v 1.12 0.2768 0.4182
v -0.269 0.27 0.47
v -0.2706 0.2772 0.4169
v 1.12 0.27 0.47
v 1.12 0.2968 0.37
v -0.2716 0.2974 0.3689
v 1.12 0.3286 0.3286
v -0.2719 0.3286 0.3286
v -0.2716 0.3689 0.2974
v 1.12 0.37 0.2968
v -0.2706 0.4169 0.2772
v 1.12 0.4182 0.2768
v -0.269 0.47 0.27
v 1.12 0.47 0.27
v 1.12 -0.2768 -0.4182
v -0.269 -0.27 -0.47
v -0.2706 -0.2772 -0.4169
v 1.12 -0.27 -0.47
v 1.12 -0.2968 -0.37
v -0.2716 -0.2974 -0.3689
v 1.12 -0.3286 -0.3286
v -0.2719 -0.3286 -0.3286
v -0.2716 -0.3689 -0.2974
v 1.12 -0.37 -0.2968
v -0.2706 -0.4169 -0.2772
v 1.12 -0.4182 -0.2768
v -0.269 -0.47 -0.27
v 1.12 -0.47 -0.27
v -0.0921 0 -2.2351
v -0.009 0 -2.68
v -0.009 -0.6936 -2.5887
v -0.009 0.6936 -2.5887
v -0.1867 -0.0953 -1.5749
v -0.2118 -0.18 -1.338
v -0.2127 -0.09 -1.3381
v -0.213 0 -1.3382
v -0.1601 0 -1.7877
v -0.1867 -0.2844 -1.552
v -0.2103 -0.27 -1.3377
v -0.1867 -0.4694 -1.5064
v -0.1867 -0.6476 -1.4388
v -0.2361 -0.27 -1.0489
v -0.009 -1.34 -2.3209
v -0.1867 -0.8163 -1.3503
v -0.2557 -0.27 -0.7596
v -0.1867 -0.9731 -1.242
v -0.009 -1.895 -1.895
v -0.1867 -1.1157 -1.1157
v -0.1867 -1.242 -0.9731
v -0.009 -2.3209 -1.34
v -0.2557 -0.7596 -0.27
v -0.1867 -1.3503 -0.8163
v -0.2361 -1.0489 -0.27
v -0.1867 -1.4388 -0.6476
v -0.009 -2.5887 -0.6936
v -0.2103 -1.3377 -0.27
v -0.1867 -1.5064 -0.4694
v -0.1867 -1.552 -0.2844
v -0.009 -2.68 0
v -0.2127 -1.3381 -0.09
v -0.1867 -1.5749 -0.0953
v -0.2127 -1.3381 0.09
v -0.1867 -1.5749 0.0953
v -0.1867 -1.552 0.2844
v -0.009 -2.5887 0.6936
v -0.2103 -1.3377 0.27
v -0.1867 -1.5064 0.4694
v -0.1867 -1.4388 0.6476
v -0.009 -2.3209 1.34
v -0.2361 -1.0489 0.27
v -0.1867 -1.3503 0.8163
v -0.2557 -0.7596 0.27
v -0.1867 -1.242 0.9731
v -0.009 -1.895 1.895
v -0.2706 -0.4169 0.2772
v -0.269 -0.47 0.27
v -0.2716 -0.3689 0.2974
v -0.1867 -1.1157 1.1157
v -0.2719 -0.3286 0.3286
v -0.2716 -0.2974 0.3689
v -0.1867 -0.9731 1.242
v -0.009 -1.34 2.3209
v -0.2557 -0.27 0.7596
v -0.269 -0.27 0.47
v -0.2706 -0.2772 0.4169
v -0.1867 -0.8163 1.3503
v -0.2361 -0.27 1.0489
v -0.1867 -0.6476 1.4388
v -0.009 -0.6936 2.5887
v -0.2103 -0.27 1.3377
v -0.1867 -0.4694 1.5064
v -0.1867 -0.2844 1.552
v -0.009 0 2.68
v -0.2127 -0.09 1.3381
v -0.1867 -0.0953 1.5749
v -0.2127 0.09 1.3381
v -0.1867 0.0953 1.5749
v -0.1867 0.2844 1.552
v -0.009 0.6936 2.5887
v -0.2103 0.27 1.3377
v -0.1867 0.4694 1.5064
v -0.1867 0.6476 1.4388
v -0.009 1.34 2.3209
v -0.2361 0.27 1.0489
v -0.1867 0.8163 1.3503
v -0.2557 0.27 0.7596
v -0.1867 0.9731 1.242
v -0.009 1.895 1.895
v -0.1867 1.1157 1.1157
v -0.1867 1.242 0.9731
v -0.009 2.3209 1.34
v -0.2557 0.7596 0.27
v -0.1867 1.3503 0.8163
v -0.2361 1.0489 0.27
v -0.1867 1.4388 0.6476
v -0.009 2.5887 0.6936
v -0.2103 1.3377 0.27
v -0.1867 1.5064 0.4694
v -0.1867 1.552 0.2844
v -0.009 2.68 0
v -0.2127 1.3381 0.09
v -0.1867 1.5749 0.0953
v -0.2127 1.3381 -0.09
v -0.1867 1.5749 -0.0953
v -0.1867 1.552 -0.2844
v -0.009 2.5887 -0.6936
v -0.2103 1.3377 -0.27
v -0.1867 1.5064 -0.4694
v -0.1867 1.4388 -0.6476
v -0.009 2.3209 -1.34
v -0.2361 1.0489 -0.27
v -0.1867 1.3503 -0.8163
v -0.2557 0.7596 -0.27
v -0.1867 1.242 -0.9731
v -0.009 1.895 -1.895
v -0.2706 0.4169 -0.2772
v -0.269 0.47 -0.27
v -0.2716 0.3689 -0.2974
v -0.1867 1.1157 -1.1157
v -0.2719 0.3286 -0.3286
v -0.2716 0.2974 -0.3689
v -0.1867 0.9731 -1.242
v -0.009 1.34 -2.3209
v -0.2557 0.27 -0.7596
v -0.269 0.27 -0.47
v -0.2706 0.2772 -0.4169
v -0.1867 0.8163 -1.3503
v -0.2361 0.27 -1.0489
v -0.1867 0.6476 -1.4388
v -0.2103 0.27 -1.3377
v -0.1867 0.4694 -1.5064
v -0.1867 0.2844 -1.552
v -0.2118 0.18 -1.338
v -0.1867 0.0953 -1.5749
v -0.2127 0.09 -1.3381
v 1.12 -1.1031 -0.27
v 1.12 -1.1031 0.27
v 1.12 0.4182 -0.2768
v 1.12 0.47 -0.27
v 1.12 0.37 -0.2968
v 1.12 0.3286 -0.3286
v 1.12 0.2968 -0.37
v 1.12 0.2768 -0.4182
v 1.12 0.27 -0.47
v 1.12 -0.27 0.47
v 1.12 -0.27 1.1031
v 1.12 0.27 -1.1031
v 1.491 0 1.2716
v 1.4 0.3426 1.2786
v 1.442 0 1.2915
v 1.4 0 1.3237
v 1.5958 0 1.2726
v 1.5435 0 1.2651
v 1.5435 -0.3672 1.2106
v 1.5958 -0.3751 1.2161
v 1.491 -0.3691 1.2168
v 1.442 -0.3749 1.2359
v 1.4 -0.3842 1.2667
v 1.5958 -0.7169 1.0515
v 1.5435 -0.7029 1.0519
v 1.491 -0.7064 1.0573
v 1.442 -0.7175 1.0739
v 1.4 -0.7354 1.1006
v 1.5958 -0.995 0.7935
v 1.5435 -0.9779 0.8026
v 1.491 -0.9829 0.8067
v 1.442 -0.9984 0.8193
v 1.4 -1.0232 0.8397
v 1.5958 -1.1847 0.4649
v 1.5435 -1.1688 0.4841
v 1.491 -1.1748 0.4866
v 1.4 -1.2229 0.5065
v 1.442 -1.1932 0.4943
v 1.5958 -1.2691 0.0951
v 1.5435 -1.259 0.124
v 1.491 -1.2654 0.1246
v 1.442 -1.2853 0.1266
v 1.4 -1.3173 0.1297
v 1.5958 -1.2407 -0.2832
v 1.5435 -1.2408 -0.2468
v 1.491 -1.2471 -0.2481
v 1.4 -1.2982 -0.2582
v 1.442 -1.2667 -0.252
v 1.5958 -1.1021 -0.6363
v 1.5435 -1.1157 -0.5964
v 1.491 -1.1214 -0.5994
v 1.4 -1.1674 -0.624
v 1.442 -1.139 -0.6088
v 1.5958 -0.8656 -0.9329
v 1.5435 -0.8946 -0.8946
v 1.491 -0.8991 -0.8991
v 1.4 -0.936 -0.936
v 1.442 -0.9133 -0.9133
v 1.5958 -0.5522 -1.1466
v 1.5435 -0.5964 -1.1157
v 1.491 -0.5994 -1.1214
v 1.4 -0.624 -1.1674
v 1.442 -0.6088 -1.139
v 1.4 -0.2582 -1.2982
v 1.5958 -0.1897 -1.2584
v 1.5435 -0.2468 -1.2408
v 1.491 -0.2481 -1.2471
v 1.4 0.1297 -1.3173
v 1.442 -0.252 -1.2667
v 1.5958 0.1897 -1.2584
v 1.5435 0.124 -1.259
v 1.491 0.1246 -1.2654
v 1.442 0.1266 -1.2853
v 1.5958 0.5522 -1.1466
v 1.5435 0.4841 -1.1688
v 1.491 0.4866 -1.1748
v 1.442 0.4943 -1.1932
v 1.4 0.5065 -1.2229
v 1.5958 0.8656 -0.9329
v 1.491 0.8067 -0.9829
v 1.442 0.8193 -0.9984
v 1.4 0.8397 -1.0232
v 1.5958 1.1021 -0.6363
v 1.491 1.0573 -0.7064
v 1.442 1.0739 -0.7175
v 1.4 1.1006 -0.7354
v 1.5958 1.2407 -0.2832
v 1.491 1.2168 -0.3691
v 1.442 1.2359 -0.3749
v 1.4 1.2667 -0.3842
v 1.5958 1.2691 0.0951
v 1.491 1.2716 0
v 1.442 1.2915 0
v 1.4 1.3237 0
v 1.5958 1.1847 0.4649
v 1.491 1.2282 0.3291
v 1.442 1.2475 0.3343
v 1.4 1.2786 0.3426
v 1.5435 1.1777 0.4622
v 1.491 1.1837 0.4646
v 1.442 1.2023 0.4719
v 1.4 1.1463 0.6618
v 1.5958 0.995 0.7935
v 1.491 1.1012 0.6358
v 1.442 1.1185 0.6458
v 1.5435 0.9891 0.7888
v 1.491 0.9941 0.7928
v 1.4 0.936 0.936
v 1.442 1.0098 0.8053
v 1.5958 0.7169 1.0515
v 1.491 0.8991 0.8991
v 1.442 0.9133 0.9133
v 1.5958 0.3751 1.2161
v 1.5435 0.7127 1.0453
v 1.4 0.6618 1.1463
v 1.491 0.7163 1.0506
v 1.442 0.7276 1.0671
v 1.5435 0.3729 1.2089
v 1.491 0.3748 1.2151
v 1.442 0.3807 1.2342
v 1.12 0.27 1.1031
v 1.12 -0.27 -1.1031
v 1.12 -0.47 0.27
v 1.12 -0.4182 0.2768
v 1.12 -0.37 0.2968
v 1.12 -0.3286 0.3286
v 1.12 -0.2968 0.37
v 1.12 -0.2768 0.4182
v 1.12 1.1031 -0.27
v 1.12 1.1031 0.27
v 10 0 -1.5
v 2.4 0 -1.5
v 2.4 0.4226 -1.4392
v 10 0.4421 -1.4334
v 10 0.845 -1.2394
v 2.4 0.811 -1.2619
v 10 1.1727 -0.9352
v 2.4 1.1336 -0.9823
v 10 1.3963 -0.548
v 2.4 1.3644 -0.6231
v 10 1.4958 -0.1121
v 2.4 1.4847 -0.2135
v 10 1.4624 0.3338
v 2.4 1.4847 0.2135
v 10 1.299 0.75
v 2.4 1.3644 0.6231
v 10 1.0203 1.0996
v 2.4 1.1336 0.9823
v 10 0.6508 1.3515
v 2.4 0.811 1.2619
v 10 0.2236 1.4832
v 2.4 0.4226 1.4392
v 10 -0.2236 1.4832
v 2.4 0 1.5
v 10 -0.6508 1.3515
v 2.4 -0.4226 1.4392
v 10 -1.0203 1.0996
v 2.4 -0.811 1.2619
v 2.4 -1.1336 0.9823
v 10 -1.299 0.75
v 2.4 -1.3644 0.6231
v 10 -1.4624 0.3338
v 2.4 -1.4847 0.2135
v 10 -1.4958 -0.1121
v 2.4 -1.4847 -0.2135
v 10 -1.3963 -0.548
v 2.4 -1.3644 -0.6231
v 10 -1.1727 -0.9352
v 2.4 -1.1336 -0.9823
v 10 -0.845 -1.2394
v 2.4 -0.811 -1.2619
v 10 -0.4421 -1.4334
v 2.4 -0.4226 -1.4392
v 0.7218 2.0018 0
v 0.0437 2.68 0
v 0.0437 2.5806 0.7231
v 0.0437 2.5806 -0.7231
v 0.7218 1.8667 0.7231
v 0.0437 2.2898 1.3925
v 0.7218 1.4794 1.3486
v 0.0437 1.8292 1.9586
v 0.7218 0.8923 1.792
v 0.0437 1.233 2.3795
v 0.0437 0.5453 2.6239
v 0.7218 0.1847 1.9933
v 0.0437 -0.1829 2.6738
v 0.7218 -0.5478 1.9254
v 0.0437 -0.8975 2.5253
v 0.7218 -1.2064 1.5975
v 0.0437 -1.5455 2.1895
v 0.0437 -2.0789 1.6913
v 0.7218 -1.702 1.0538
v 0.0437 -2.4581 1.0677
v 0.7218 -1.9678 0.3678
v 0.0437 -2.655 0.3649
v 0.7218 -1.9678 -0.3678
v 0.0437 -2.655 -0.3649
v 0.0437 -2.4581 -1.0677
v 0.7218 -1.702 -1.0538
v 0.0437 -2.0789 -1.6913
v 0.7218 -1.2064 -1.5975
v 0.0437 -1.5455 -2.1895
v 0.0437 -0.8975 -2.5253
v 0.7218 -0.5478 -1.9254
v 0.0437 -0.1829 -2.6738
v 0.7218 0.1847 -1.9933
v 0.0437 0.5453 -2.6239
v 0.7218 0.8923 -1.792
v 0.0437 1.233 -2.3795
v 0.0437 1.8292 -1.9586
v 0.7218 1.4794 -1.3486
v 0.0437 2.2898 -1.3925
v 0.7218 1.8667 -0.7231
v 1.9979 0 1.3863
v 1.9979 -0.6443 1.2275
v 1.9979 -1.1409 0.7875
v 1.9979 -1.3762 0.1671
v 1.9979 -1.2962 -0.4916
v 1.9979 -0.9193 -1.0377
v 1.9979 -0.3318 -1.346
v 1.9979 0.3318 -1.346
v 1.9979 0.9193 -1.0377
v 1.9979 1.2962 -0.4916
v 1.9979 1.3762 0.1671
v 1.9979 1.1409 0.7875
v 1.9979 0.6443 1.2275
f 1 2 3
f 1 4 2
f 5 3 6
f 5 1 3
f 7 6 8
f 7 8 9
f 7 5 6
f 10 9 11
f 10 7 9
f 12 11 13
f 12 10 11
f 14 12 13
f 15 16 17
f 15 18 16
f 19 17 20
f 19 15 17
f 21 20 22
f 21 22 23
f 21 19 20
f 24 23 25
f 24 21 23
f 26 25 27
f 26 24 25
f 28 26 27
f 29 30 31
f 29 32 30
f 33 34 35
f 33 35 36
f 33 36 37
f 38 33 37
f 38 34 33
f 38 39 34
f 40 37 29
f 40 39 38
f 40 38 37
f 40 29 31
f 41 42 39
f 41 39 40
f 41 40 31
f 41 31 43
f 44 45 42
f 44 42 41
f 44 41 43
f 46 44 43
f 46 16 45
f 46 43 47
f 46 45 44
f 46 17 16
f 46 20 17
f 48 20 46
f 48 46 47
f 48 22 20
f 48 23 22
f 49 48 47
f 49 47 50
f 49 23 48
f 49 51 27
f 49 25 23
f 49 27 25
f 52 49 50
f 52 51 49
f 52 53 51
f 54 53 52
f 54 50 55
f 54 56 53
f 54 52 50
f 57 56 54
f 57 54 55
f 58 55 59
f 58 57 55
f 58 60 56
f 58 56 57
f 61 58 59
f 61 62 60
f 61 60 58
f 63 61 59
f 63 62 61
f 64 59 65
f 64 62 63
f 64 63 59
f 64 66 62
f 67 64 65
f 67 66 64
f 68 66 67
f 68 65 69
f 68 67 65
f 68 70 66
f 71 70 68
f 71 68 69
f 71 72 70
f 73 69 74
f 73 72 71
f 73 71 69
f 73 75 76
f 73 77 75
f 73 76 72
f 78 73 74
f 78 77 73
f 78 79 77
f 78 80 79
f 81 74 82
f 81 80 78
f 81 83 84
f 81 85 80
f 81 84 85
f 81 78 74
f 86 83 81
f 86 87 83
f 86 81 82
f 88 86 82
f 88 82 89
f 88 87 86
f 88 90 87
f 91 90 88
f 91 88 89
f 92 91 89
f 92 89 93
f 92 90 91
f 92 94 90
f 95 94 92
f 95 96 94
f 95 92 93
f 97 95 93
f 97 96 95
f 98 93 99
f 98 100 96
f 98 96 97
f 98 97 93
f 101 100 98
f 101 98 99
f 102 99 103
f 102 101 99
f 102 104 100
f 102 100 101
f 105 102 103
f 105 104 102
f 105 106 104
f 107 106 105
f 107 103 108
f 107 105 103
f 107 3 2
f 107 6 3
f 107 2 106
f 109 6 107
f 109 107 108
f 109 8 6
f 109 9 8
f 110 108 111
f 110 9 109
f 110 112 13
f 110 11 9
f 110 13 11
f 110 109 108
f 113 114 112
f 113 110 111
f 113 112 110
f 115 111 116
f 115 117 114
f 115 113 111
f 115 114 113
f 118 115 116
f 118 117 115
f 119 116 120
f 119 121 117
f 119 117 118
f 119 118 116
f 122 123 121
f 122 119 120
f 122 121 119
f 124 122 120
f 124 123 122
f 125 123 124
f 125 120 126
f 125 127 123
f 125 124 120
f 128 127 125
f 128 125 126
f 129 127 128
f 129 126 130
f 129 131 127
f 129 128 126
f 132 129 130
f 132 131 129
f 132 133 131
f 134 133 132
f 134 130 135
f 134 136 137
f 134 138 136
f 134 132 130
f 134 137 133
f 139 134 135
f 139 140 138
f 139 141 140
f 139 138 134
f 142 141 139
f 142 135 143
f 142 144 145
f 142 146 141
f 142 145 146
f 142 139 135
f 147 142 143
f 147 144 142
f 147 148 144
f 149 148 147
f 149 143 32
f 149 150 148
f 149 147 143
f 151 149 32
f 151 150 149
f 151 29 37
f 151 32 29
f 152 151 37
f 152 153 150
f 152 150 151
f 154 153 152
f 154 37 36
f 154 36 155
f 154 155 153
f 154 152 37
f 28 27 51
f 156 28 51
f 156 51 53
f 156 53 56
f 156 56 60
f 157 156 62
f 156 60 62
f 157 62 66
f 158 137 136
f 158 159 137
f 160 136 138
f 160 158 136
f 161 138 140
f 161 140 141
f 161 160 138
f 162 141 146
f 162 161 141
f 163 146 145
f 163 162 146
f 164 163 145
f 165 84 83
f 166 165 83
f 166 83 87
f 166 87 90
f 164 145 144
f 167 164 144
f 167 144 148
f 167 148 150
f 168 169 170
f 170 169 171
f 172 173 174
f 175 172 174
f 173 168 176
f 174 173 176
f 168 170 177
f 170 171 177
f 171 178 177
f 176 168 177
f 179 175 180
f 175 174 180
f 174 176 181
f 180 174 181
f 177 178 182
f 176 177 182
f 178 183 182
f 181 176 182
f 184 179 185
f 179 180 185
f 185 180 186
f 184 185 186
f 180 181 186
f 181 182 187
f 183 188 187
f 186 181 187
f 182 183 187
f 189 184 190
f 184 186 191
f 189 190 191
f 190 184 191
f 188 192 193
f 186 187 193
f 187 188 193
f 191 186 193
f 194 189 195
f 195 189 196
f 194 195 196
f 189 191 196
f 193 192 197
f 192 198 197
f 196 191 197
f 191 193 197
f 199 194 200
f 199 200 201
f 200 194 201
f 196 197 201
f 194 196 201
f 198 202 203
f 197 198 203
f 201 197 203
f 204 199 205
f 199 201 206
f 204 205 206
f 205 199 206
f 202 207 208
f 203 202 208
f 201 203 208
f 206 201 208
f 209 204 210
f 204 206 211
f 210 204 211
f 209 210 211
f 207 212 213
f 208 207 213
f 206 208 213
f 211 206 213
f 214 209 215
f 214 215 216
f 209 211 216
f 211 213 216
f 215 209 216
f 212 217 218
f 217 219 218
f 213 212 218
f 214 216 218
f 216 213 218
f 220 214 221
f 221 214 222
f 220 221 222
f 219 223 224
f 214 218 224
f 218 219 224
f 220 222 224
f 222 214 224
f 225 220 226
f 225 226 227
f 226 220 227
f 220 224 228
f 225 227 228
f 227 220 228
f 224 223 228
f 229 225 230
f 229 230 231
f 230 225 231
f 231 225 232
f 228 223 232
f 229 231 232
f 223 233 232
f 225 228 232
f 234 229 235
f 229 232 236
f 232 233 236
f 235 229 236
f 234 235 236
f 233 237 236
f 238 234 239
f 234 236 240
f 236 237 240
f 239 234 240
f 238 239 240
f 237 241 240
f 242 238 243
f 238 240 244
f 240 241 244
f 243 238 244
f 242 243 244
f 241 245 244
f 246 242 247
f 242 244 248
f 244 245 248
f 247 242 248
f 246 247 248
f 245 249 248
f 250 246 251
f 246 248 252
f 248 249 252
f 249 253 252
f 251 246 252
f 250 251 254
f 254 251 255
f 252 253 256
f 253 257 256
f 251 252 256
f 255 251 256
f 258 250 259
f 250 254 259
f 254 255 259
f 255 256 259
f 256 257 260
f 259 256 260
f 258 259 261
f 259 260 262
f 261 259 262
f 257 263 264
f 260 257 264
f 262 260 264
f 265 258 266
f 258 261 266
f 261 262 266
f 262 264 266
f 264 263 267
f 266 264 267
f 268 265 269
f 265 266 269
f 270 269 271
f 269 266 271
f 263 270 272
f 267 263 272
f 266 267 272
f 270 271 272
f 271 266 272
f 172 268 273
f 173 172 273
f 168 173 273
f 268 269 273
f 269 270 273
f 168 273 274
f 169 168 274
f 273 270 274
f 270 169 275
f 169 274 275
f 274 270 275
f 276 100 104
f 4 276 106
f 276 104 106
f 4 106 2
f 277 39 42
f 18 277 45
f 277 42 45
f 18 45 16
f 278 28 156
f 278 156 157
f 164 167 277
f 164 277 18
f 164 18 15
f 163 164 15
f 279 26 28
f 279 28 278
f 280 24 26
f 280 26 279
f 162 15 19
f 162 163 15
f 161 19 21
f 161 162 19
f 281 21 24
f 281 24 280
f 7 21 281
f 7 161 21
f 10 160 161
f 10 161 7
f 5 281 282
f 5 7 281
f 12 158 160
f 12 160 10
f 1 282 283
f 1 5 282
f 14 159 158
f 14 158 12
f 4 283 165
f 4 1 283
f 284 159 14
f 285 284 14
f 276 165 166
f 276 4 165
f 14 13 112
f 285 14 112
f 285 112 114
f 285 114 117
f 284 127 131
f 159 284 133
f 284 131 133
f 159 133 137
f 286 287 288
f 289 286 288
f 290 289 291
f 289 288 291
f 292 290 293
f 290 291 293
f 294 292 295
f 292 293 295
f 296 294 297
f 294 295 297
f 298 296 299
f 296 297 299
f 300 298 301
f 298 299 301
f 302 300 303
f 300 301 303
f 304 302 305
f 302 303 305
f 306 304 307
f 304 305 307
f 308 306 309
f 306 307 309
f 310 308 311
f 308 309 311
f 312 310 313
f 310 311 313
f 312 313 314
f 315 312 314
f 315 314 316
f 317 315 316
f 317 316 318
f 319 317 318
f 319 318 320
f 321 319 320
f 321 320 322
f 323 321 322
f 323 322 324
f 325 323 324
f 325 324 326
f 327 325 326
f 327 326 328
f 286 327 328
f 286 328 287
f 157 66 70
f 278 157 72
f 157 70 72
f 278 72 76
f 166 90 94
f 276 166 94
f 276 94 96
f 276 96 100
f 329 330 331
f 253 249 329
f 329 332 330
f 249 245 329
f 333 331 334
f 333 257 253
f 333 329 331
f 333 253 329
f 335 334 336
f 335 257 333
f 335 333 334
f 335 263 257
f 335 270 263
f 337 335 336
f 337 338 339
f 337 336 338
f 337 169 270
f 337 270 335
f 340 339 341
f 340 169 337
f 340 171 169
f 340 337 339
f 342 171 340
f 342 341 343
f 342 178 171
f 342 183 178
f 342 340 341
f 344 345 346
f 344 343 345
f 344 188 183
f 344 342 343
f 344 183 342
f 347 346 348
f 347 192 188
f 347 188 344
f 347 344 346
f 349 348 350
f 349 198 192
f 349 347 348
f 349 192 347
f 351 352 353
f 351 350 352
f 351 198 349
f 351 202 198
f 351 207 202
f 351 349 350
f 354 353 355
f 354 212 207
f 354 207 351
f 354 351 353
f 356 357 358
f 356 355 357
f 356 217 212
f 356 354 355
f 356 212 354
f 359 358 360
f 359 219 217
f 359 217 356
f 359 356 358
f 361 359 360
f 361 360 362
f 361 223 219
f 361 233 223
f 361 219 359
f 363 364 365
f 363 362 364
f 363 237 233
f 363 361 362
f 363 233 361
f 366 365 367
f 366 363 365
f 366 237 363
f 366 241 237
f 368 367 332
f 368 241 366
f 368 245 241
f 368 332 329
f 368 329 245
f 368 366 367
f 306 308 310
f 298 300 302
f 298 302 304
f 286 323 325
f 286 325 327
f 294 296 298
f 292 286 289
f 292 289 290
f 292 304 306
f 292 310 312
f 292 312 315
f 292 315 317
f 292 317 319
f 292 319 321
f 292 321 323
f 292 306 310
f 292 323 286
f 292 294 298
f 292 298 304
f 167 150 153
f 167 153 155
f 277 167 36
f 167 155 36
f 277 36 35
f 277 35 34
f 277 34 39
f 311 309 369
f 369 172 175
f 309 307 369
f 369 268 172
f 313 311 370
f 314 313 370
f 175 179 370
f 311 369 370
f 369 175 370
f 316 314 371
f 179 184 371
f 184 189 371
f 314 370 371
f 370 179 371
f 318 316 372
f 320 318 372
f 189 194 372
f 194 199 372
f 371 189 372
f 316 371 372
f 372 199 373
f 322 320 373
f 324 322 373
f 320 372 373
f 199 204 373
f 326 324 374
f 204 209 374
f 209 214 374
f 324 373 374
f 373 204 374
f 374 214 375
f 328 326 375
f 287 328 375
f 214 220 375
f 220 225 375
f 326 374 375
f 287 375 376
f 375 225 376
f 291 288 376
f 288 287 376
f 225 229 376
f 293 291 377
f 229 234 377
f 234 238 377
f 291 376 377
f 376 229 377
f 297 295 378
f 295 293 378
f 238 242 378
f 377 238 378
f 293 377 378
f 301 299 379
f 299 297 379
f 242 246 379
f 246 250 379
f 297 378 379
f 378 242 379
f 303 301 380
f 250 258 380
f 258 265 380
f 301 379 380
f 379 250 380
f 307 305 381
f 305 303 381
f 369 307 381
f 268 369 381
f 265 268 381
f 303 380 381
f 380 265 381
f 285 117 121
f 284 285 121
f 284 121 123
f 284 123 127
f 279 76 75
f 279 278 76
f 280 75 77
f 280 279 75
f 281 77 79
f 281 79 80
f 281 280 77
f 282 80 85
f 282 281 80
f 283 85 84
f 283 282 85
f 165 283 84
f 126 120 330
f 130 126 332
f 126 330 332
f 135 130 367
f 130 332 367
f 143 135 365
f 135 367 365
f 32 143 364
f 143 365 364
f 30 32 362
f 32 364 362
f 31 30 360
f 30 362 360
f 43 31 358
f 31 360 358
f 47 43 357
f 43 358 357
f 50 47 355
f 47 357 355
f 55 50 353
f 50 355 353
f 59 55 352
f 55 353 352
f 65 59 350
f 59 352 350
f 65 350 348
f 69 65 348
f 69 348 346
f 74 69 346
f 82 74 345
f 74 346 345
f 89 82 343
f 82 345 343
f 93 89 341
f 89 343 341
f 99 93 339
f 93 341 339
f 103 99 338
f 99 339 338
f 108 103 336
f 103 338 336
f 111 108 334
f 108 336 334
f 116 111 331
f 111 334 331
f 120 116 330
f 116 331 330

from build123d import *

# Parameters (mm, degrees)
SKETCH1_R           = 1.5
BASEBODY_DEPTH      = 10
BASETOP_FACE_RADIUS = 2.723673019
BASETOP_HEIGHT      = 0.28
SKETCH5_W           = 4
SKETCH5_H           = 2
CROSSRECESS_DEPTH   = 1.4
FILLET1_R           = 0.2
DRAFT3_ANGLE        = -10


# Read off the part's stored shape, not the designer's step: Neck, BaseHead
with BuildPart() as part:
    # Sketch1 → BaseBody (new body)
    with BuildSketch(Plane(origin=(0, 0, 0), x_dir=(0, 0, -1), z_dir=(1, 0, 0))):
        Circle(SKETCH1_R)
    extrude(amount=BASEBODY_DEPTH)

    # Neck outline → Neck (revolve, cut)
    with BuildSketch(Plane.YX):
        Polygon((1.5, 2.4), (1.076815246, 0), (1.5, 0), align=None)
    revolve(axis=Axis((0, 0, 0), (1, 0, 0)), mode=Mode.SUBTRACT)

    # BaseHead outline → BaseHead (revolve)
    with BuildSketch(Plane.YX):
        Polygon((0, 0), (2.723673019, 0), (1.323673019, 1.4), (0, 1.4), align=None)
    revolve(axis=Axis((0, 0, 0), (1, 0, 0)))

    # BaseTop: a dome of height H over a round flat face of radius A is a cap of a sphere of radius (A * A + H * H) / (2 * H)
    basetop_r = (BASETOP_FACE_RADIUS * BASETOP_FACE_RADIUS + BASETOP_HEIGHT * BASETOP_HEIGHT) / (2 * BASETOP_HEIGHT)
    basetop_base = Plane((0, 0, 0), z_dir=(-1, 0, 0))
    with Locations(basetop_base.offset(BASETOP_HEIGHT - basetop_r)):
        basetop_ball = Sphere(basetop_r, mode=Mode.PRIVATE)
    add(split(basetop_ball, bisect_by=basetop_base, keep=Keep.TOP, mode=Mode.PRIVATE))

    # Sketch5 → Cut-Revolve1 (revolve, cut)
    with BuildSketch(Plane.XY):
        with Locations((0, 3.68)):
            Rectangle(SKETCH5_W, SKETCH5_H)
    revolve(axis=Axis((10, 0, 0), (-1, 0, 0)), mode=Mode.SUBTRACT)

    # Sketch7 → CrossRecess (cut)
    with BuildSketch(Plane(origin=(-0.28, 0, 0), x_dir=(0, 0, -1), z_dir=(1, 0, 0))):
        Polygon((0.27, -0.27), (0.27, -1.35), (-0.27, -1.35), (-0.27, -0.27), (-1.35, -0.27), (-1.35, 0.27), (-0.27, 0.27), (-0.27, 1.35), (0.27, 1.35), (0.27, 0.27), (1.35, 0.27), (1.35, -0.27), align=None)
    extrude(amount=CROSSRECESS_DEPTH, mode=Mode.SUBTRACT)

    # Fillet1
    fillet1_edges = [part.edges().sort_by_distance(p)[0] for p in [
        (0.422723318, 0.27, 0.27),
        (0.422723318, -0.27, 0.27),
        (0.422723318, -0.27, -0.27),
        (0.422723318, 0.27, -0.27),
    ]]
    fillet(fillet1_edges, radius=FILLET1_R)

    # Draft3
    draft3_faces = [part.faces().sort_by_distance(p)[0] for p in [
        (0.454577412, -1.35, 0),
        (0.454577412, 0, 1.35),
        (0.454577412, 0, -1.35),
        (0.454577412, 1.35, 0),
    ]]
    draft(draft3_faces, Plane(origin=(-0.28, 0, 0), x_dir=(0, 0, 1), z_dir=(1, 0, 0)), DRAFT3_ANGLE)

    # Sketch8 → Cut-Revolve2 (revolve, cut)
    with BuildSketch(Plane.XY, mode=Mode.PRIVATE) as cut_revolve2_sk:
        with BuildLine():
            Line((1.4, 1.323673019), (0.043673019, 2.68))
            Line((0.043673019, 2.68), (2.4, 2.68))
            Line((2.4, 2.68), (2.4, 1.5))
            Line((2.4, 1.5), (1.595834298, 1.272638584))
            ThreePointArc((1.595834298, 1.272638584), (1.490985809, 1.271558189), (1.4, 1.323673019))
        make_face()
    revolve(cut_revolve2_sk.sketch.rotate(Axis((0, 0, 0), (1, 0, 0)), 90), axis=Axis((0, 0, 0), (1, 0, 0)), mode=Mode.SUBTRACT)


solid = part.part
